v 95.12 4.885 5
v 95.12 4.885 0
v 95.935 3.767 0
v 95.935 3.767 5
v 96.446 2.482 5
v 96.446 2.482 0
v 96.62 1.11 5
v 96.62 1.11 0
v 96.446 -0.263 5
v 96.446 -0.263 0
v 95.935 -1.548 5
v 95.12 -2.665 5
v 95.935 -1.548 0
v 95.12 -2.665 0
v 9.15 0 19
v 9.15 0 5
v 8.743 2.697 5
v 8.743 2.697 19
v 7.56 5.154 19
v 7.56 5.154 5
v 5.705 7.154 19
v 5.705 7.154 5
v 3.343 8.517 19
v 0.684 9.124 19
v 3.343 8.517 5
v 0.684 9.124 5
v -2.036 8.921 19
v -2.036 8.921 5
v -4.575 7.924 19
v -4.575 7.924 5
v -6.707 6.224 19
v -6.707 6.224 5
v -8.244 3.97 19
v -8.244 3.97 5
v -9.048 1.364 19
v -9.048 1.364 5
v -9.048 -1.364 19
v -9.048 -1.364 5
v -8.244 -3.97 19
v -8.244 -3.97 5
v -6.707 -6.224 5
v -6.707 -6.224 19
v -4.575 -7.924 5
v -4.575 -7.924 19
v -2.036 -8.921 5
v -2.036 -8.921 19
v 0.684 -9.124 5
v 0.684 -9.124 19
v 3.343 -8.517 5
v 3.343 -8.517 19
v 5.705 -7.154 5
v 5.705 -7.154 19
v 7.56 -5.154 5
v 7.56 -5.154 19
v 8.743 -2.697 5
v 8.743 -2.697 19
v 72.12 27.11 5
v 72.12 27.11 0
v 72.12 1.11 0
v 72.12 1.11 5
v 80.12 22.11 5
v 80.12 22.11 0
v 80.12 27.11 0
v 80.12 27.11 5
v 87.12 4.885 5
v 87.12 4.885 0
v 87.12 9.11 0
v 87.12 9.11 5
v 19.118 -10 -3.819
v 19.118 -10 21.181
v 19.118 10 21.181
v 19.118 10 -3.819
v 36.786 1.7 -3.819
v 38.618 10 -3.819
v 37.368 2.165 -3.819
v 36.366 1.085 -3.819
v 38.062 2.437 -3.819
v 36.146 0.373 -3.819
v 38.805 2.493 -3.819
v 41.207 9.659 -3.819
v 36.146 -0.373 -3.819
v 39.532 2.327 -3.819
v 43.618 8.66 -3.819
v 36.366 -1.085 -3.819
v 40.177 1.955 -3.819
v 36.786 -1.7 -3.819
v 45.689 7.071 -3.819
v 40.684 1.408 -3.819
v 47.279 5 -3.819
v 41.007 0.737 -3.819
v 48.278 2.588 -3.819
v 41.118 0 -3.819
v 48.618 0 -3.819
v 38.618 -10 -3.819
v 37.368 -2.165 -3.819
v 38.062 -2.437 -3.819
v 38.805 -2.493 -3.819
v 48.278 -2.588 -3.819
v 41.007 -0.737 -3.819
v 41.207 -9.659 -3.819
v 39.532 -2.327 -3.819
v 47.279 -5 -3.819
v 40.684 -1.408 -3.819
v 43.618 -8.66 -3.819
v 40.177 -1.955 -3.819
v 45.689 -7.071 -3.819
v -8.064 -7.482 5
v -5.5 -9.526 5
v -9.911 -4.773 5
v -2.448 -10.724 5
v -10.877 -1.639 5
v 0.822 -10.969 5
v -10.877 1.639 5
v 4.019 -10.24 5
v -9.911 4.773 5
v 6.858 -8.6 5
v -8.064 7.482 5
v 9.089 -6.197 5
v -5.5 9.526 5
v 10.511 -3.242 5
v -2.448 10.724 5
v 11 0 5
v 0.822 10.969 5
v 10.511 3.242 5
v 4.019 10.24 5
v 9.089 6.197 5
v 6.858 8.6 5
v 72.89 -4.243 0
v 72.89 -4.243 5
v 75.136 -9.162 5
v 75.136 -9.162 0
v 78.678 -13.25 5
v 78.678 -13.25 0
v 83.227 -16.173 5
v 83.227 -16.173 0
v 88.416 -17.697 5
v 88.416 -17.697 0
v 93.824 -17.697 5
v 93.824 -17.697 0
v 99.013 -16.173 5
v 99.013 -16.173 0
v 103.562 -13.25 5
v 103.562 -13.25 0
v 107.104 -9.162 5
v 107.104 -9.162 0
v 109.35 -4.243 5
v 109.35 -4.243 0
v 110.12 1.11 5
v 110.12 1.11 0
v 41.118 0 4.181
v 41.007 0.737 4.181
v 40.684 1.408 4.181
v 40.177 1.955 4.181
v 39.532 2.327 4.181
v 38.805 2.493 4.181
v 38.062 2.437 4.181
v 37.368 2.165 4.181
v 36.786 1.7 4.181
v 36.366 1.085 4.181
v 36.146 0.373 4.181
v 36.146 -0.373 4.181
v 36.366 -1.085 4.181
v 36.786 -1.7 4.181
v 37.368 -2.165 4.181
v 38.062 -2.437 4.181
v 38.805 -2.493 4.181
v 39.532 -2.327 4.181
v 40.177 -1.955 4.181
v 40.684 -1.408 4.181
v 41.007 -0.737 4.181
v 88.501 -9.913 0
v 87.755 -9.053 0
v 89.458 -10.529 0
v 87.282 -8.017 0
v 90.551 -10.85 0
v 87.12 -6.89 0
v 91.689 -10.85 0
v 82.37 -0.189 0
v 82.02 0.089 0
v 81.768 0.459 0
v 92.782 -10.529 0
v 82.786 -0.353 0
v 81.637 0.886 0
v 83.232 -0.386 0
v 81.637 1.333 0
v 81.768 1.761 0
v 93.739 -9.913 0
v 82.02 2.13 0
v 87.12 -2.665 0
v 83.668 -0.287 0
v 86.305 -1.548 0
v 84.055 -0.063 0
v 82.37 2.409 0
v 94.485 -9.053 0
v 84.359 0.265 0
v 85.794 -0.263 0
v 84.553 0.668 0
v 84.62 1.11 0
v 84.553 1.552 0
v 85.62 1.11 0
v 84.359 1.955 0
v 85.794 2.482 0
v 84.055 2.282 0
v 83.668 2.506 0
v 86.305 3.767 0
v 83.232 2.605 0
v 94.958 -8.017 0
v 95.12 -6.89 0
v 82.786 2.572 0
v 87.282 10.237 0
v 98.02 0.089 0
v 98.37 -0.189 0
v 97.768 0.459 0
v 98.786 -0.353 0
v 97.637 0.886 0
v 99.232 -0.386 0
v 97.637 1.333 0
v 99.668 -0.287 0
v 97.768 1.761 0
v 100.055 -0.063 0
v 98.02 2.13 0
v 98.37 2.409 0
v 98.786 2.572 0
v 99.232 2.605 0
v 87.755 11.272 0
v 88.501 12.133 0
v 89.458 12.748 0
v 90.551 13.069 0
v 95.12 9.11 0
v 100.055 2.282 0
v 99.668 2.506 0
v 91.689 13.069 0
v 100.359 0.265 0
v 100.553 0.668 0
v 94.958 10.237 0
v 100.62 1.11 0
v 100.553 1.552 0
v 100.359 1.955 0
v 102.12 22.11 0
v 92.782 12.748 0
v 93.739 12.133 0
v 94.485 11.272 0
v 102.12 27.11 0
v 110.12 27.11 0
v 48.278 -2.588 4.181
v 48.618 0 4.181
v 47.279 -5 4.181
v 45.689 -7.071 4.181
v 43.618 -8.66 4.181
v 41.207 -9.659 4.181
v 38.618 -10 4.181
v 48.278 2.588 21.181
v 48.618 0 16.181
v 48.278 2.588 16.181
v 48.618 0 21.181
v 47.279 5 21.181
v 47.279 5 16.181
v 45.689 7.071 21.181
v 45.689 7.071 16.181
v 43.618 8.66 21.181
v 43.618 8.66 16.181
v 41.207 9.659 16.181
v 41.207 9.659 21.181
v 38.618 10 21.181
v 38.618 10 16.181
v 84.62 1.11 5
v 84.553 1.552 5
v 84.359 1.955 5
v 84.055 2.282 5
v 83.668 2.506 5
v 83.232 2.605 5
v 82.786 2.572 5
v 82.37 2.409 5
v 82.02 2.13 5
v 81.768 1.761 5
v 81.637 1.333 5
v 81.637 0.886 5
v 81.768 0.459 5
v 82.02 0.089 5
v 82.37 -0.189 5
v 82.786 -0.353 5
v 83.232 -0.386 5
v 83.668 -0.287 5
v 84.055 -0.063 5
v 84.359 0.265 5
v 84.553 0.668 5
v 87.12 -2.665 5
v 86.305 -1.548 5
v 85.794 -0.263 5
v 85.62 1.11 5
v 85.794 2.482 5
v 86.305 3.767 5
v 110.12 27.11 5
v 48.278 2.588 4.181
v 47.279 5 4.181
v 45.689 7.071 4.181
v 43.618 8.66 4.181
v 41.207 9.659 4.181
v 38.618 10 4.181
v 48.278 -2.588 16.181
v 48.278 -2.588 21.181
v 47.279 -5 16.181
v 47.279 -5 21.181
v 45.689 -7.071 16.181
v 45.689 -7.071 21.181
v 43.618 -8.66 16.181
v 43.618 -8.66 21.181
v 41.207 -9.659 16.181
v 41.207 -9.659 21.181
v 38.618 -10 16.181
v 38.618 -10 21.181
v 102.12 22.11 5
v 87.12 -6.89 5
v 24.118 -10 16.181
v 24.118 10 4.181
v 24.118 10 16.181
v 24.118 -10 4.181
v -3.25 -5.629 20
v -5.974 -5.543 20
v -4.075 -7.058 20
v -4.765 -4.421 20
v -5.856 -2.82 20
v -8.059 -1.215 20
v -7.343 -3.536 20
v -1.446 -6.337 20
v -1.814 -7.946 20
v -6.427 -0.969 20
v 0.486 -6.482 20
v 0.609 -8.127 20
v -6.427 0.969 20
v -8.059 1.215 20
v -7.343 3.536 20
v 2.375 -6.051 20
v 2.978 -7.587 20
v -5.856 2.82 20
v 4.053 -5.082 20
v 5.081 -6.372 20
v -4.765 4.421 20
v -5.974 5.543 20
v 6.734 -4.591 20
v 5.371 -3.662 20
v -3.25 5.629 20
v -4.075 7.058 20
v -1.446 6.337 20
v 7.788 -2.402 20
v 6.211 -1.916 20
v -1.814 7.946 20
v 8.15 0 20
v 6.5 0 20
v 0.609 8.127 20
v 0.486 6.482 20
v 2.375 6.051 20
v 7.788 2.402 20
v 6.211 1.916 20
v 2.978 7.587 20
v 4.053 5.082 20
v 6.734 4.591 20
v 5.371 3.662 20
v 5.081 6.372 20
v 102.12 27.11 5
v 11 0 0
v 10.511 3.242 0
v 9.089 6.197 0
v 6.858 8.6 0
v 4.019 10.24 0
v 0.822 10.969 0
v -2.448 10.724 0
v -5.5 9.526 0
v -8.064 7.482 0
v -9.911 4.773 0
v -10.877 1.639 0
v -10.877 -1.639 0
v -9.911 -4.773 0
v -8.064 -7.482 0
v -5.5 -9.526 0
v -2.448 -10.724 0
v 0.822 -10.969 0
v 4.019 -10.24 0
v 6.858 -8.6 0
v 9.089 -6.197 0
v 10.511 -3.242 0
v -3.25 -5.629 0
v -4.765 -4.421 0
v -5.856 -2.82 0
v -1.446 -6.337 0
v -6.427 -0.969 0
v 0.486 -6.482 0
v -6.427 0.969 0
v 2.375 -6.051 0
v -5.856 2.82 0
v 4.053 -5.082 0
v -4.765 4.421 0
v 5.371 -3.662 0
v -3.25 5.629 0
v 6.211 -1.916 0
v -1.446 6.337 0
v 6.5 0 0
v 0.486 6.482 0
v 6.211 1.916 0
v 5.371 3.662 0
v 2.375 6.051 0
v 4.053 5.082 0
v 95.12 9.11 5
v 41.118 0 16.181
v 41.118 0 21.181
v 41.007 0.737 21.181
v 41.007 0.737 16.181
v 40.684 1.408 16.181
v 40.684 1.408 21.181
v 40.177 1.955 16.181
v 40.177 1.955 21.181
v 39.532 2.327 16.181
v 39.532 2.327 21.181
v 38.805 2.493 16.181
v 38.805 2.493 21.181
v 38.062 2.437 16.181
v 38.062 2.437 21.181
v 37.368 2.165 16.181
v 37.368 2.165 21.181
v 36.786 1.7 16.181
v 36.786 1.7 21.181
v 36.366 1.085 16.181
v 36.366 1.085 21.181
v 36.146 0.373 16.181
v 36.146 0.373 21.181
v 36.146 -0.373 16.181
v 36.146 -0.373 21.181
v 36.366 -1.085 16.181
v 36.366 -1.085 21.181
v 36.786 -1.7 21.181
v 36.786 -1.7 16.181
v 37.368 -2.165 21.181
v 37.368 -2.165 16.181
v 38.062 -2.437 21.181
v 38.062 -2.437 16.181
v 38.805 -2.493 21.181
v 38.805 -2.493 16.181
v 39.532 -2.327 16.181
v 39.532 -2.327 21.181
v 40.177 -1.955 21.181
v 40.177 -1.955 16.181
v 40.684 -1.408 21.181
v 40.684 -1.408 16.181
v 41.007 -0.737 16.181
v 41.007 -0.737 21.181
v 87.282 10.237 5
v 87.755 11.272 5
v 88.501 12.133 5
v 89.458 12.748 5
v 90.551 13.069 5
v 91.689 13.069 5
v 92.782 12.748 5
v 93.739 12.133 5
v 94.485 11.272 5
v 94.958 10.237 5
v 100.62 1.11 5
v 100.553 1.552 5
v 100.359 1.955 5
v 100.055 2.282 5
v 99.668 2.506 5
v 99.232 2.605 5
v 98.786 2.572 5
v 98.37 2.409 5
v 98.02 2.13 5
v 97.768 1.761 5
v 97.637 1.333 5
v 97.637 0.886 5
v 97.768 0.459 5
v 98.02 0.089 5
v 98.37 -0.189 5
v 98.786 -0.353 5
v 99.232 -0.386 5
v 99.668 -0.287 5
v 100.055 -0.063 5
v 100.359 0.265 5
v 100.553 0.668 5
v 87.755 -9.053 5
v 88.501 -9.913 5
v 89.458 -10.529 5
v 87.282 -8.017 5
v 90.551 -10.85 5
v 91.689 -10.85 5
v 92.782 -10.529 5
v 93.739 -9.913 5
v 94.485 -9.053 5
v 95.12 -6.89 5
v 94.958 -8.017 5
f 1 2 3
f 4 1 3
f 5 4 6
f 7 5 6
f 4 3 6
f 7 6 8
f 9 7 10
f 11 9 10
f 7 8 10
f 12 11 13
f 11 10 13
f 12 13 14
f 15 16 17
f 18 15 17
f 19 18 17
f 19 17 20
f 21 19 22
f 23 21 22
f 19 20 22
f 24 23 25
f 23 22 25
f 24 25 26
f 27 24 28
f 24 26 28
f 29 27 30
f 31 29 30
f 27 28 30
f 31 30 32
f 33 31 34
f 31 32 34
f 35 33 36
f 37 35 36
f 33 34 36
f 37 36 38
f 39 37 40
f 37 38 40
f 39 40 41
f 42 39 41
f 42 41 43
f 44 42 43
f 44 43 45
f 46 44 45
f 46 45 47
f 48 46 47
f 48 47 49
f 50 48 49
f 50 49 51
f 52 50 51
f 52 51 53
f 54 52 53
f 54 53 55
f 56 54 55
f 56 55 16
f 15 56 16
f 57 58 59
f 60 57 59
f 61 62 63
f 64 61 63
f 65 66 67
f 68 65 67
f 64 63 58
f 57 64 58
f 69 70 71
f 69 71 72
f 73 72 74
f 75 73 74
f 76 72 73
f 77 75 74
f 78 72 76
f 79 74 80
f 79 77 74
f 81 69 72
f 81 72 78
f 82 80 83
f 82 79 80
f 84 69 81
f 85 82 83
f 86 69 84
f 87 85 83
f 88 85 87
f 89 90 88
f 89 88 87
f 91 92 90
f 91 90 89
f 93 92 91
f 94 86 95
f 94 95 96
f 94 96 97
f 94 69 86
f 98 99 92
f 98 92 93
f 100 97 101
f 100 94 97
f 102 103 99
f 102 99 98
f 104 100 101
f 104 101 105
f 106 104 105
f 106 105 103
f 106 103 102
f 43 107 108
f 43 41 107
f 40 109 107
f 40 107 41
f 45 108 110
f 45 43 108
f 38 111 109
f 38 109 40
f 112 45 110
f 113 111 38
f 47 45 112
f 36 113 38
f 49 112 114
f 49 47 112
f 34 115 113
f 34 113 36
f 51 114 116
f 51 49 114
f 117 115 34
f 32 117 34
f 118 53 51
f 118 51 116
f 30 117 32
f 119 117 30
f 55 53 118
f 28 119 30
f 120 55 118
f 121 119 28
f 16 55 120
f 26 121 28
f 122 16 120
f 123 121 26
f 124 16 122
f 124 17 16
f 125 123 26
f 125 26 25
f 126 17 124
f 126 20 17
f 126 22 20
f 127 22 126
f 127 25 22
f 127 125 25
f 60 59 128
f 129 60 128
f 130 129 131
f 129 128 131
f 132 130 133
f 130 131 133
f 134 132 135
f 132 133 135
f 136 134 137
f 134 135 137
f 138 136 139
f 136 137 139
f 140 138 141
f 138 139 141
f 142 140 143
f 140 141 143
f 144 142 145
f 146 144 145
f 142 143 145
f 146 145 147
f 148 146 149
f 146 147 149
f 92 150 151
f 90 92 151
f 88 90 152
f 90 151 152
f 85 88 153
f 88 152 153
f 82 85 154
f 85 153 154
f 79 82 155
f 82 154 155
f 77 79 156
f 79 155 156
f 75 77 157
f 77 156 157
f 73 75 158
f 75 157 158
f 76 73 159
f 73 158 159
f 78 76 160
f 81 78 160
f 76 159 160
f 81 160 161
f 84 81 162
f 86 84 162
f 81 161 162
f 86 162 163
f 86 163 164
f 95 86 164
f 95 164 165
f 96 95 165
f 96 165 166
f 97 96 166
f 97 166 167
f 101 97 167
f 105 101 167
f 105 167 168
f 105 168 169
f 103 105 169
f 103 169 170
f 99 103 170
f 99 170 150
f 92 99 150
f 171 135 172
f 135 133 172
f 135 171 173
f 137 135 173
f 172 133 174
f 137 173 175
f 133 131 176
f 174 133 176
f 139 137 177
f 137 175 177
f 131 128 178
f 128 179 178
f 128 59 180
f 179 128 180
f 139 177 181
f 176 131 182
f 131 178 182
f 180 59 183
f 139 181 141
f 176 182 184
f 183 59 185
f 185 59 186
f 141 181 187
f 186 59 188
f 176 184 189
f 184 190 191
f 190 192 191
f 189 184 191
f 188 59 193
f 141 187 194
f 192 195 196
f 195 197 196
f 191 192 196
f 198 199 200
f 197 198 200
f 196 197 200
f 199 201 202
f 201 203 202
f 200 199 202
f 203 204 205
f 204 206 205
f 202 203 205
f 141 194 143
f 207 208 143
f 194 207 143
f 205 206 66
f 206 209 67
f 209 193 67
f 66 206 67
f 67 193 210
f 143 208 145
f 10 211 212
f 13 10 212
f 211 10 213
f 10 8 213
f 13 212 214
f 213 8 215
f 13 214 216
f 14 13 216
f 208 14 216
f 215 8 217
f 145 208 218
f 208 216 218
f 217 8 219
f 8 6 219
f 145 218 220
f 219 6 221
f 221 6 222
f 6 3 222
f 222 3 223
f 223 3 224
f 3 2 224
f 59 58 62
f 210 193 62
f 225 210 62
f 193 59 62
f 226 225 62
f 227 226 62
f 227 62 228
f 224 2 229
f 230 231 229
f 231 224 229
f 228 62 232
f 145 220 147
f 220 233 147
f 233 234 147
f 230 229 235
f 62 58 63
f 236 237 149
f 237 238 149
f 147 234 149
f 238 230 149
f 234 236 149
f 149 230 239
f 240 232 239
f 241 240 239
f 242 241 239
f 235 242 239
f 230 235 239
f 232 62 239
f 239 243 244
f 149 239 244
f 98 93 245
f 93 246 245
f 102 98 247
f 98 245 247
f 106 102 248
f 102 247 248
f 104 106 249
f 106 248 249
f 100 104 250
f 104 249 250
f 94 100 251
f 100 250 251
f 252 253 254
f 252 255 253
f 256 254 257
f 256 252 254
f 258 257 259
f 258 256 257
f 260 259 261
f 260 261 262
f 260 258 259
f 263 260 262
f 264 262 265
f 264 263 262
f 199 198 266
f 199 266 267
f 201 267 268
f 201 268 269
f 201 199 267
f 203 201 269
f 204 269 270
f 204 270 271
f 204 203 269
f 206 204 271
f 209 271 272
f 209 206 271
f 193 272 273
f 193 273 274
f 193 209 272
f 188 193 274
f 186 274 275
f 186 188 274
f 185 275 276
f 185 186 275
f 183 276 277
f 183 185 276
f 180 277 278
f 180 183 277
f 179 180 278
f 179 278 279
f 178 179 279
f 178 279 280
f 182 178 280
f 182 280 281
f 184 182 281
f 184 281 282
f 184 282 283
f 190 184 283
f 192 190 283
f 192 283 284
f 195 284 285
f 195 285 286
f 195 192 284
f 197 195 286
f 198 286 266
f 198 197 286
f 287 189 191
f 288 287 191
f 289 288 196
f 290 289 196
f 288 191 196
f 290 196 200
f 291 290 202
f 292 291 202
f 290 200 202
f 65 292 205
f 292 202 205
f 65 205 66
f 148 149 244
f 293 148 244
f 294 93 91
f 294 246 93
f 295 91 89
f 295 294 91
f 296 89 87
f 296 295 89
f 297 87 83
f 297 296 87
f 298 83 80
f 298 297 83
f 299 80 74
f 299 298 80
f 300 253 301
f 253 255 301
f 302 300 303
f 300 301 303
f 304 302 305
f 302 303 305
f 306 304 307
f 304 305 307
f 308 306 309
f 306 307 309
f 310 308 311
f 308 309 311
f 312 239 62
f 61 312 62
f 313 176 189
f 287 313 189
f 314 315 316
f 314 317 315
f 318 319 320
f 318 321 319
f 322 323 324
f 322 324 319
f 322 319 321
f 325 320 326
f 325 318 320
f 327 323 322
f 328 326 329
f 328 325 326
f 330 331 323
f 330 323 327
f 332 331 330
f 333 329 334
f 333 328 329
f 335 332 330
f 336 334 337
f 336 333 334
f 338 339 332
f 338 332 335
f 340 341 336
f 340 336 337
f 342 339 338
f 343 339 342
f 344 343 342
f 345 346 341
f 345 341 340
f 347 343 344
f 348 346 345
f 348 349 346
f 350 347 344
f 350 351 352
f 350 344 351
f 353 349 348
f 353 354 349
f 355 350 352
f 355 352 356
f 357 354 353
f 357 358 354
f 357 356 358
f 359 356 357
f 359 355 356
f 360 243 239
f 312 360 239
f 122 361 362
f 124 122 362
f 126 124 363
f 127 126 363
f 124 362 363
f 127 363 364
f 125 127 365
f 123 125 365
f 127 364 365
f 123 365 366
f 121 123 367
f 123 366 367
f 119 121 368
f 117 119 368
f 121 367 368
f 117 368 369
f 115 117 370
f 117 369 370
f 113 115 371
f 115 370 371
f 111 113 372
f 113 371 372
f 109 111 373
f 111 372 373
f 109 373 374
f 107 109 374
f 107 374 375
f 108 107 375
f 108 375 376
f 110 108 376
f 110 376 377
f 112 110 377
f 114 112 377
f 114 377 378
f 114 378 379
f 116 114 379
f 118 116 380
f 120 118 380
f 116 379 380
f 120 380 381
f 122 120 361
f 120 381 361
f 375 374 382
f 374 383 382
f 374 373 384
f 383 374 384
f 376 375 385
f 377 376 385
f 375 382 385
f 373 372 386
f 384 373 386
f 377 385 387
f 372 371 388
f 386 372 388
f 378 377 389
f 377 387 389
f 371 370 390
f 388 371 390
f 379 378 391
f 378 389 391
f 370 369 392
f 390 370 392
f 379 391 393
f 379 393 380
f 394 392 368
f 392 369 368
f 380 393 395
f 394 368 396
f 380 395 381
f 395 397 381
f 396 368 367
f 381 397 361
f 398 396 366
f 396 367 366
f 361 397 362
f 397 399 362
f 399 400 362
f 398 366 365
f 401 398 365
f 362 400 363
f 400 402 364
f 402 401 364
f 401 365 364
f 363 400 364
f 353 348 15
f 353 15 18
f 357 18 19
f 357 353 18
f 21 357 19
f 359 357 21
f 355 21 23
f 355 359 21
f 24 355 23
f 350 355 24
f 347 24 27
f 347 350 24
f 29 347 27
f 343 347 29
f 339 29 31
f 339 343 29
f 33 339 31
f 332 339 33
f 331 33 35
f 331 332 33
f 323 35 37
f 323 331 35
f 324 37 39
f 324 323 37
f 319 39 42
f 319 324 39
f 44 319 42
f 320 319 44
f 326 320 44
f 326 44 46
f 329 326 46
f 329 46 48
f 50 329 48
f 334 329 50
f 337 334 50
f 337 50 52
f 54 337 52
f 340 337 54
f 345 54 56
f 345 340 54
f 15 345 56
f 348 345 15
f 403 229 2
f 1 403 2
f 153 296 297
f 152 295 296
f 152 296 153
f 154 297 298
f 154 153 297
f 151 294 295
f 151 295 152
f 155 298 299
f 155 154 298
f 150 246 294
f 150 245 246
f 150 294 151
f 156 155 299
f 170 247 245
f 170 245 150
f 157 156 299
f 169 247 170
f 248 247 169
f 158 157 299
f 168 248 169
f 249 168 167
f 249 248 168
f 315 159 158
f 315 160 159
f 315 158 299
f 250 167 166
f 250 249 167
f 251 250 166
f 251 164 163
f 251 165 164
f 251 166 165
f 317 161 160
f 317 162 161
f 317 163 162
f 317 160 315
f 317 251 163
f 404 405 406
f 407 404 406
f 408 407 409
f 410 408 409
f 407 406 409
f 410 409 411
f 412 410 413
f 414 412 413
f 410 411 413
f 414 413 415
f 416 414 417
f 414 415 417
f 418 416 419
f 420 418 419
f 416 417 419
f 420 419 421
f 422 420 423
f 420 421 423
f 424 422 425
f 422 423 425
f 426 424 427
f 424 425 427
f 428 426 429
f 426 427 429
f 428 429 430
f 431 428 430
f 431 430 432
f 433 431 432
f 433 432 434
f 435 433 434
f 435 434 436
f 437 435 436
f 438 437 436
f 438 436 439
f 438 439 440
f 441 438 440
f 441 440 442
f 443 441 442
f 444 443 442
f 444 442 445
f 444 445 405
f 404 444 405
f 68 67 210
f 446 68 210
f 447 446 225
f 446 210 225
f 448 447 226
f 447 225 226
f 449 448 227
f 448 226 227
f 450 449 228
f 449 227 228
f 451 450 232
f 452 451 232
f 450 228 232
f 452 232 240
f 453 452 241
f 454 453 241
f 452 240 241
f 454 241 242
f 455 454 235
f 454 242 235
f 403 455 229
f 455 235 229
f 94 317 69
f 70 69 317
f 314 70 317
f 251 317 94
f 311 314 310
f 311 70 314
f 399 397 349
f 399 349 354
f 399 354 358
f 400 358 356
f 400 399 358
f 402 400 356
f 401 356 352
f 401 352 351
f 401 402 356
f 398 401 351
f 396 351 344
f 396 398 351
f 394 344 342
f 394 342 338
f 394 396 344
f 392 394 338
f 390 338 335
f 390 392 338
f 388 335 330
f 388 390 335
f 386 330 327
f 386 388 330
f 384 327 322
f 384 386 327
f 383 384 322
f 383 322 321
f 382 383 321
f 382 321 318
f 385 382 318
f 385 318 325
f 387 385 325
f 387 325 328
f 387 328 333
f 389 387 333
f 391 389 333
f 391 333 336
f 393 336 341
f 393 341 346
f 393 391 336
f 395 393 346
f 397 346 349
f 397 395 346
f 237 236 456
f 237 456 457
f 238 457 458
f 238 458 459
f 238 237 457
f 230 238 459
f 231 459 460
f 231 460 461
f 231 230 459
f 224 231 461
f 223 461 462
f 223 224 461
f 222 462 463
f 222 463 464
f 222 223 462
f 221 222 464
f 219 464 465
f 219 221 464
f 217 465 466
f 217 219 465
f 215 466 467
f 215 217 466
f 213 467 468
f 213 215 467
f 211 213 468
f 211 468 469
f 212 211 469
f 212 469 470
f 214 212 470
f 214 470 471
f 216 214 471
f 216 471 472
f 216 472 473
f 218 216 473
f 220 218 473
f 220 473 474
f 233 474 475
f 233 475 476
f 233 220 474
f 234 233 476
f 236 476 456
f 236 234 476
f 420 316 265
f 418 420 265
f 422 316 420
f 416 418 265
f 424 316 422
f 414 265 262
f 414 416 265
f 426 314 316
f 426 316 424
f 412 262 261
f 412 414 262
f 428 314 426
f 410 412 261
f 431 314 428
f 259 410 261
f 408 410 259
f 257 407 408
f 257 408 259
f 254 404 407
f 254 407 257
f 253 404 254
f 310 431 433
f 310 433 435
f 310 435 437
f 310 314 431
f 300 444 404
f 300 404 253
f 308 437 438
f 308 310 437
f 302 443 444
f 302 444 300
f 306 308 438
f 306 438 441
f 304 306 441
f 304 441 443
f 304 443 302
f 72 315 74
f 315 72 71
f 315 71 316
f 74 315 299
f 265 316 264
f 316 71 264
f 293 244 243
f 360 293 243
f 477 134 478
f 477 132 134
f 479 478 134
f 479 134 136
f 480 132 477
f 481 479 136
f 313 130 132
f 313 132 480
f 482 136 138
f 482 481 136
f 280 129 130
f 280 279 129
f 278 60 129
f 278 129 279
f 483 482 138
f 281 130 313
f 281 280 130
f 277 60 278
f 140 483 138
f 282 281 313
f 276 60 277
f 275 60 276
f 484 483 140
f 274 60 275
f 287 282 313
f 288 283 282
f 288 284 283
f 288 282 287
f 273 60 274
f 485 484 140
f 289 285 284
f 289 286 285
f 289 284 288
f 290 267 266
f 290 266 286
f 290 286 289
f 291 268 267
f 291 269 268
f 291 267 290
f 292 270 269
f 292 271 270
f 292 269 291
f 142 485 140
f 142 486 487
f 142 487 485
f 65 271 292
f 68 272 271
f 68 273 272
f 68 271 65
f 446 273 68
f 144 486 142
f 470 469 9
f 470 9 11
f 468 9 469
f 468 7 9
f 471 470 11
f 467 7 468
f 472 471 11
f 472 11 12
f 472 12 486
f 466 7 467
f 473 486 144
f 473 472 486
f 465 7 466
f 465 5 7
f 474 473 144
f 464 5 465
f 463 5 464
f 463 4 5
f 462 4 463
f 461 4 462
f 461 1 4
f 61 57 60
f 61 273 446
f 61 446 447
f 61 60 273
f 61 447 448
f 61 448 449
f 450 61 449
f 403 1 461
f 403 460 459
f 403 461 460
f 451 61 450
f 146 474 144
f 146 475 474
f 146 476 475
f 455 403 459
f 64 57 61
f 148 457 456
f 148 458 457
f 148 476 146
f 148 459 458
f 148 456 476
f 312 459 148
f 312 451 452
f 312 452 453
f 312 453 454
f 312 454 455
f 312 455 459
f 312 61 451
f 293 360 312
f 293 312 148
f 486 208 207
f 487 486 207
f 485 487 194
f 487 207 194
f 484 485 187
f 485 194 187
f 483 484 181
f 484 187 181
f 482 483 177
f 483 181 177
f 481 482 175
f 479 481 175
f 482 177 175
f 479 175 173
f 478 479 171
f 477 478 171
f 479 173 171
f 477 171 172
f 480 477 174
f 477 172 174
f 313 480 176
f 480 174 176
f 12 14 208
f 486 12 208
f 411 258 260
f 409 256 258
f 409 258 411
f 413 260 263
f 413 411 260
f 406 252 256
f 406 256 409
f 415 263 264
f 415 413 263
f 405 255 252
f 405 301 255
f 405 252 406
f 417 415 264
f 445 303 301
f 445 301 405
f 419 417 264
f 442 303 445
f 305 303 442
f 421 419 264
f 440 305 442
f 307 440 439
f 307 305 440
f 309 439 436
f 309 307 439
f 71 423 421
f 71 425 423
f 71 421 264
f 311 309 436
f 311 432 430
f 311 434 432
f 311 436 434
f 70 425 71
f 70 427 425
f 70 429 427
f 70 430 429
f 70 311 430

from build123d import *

# Parameters (mm, degrees)
F0_R      = 9.15
F0_R_2    = 6.5
F1_DEPTH  = 20
F0_R_3    = 11
F2_DEPTH  = 5
F3_SIZE   = 1
F5_DEPTH  = 10
F6_R      = 9.99999
F7_R      = 2.5
F8_DEPTH  = 25.001
F9_R      = 1.5
F10_DEPTH = 5


# Not quite as in the source:
# - a fillet or chamfer is up to 0.001 mm smaller than in the source, because OpenCascade refuses the exact size


with BuildPart() as f1:
    # F0 (on Top) → F1 (new body)
    with BuildSketch(Plane.XY):
        Circle(F0_R)
        Circle(F0_R_2, mode=Mode.SUBTRACT)
    extrude(amount=F1_DEPTH)

    # F0 (on Top) → F2 (join)
    with BuildSketch(Plane.XY):
        Circle(F0_R_3)
        Circle(F0_R, mode=Mode.SUBTRACT)
    extrude(amount=F2_DEPTH)

    # F3
    f3_edges = [f1.edges().sort_by_distance(p)[0] for p in [
        (-9.15, 0, 20),
    ]]
    chamfer(f3_edges, length=F3_SIZE)


with BuildPart() as f5:
    # F4 (on Front) → F5 (new body, symmetric)
    with BuildSketch(Plane.XZ):
        Polygon((48.6184198422, 16.1811771655), (48.6184198422, 21.1811771655), (19.1184198422, 21.1811771655), (19.1184198422, -3.8188228345), (48.6184198422, -3.8188228345), (48.6184198422, 4.1811771655), (24.1184198422, 4.1811771655), (24.1184198422, 16.1811771655), align=None)
    extrude(amount=F5_DEPTH, both=True)

    # F6 (radius 10 in the source; OpenCascade refuses exactly that, so slightly less here)
    f6_edges = [f5.edges().sort_by_distance(p)[0] for p in [
        (48.61842, -10, 18.681177),
        (48.61842, 10, 18.681177),
        (48.61842, 10, 0.181177),
        (48.61842, -10, 0.181177),
    ]]
    fillet(f6_edges, radius=F6_R)

    # F7 (on face) → F8 (cut, through all)
    with BuildSketch(Plane.XY.offset(21.1811771655)):
        with Locations((38.6184198422, 0)):
            Circle(F7_R)
    extrude(amount=-F8_DEPTH, mode=Mode.SUBTRACT)


with BuildPart() as f10:
    # F9 (on Top) → F10 (new body)
    with BuildSketch(Plane.XY):
        with BuildLine():
            Line((72.1199496662, 27.1096767731), (72.1199496662, 1.1096767731))
            ThreePointArc((72.1199496662, 1.1096767731), (91.1199496662, -17.8903232269), (110.1199496662, 1.1096767731))
            Line((110.1199496662, 1.1096767731), (110.1199496662, 27.1096767731))
            Line((110.1199496662, 27.1096767731), (102.1199496662, 27.1096767731))
            Line((102.1199496662, 27.1096767731), (102.1199496662, 22.1096767731))
            Line((102.1199496662, 22.1096767731), (80.1199496662, 22.1096767731))
            Line((80.1199496662, 22.1096767731), (80.1199496662, 27.1096767731))
            Line((80.1199496662, 27.1096767731), (72.1199496662, 27.1096767731))
        make_face()
        with Locations((83.1199496662, 1.1096767731)):
            Circle(F9_R, mode=Mode.SUBTRACT)
        with BuildLine():
            ThreePointArc((87.1199496662, -2.6652404445), (85.6199496662, 1.1096767731), (87.1199496662, 4.8845939907))
            Line((87.1199496662, 4.8845939907), (87.1199496662, 9.1096767731))
            ThreePointArc((87.1199496662, 9.1096767731), (91.1199496662, 13.1096767731), (95.1199496662, 9.1096767731))
            Line((95.1199496662, 9.1096767731), (95.1199496662, 4.8845939907))
            ThreePointArc((95.1199496662, 4.8845939907), (96.6199496662, 1.1096767731), (95.1199496662, -2.6652404445))
            Line((95.1199496662, -2.6652404445), (95.1199496662, -6.8903232269))
            ThreePointArc((95.1199496662, -6.8903232269), (91.1199496662, -10.8903232269), (87.1199496662, -6.8903232269))
            Line((87.1199496662, -6.8903232269), (87.1199496662, -2.6652404445))
        make_face(mode=Mode.SUBTRACT)
        with Locations((99.1199496662, 1.1096767731)):
            Circle(F9_R, mode=Mode.SUBTRACT)
    extrude(amount=F10_DEPTH)


solid = Compound([f1.part, f5.part, f10.part])
